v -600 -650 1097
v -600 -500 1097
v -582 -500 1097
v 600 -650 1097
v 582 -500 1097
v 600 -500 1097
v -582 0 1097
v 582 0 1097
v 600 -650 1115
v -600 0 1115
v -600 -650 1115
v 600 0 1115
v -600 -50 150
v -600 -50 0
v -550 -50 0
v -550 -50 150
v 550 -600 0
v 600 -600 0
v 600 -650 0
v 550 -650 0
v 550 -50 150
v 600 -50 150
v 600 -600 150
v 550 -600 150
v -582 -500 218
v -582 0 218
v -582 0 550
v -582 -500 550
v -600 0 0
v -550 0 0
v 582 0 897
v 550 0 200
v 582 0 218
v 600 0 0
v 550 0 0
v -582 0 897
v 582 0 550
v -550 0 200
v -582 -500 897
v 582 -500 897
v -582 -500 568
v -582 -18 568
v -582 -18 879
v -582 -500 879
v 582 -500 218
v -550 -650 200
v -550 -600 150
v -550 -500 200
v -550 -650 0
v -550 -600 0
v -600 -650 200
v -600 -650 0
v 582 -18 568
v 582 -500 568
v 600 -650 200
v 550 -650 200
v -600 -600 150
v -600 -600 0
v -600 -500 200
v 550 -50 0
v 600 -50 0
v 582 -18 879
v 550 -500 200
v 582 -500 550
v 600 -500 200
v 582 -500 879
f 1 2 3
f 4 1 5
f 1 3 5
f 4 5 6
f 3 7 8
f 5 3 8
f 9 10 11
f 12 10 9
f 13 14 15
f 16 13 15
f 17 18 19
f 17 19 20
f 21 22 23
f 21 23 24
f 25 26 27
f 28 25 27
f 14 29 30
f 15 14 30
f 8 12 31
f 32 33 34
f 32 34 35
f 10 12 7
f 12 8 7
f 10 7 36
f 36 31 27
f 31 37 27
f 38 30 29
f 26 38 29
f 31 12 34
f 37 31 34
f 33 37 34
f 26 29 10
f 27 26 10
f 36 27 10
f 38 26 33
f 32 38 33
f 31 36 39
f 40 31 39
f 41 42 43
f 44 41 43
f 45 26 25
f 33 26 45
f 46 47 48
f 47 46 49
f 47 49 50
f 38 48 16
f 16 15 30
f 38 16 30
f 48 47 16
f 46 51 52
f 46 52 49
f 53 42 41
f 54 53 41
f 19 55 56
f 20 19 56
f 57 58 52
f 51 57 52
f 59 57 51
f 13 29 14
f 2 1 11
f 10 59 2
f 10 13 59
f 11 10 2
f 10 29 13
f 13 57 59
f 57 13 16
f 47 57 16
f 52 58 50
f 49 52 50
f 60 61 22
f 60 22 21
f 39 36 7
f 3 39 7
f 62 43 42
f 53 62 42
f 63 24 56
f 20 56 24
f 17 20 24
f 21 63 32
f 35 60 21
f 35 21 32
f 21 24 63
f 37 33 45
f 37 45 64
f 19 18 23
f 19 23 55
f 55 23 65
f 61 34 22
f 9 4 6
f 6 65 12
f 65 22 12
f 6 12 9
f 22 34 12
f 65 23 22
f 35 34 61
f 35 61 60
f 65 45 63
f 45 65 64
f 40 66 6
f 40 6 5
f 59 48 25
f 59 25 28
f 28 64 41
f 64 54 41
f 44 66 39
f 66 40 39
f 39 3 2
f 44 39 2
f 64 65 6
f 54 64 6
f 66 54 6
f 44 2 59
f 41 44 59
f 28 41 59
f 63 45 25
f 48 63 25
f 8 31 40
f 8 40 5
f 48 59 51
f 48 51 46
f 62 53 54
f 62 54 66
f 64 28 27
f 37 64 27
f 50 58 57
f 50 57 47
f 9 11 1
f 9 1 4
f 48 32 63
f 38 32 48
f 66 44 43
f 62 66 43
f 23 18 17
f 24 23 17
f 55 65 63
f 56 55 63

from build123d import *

# Parameters (mm, degrees)
F1_DEPTH  = 500
F3_W      = 50
F3_H      = 50
F4_DEPTH  = 650
F5_W      = 50
F5_H      = 50
F6_DEPTH  = 200
F8_W      = 1200
F8_H      = 18
F9_DEPTH  = 150
F11_DEPTH = 1164


with BuildPart() as f1:
    # F0 (on Front) → F1 (new body)
    with BuildSketch(Plane.XZ):
        Polygon((0, 1115), (-600, 1115), (-600, 200), (0, 200), (0, 218), (-582, 218), (-582, 1097), (0, 1097), align=None)
    extrude(amount=F1_DEPTH)

    # F3 (on offset) → F4 (join)
    with BuildSketch(Plane.XZ):
        with Locations((-575, 175)):
            Rectangle(F3_W, F3_H)
    extrude(amount=F4_DEPTH)

    # F5 (on Top) → F6 (join)
    with BuildSketch(Plane.XY):
        with Locations((-575, -25)):
            Rectangle(F5_W, F5_H)
        with Locations((-575, -625)):
            Rectangle(F5_W, F5_H)
    extrude(amount=F6_DEPTH)

    # F7: F1 across plane


with BuildPart() as f1_1:
    add(f1.part)
    add(f1.part.mirror(Plane.YZ))

    # F8 (on face) → F9 (join)
    with BuildSketch(Plane.XZ.offset(500)):
        with Locations((0, 1106)):
            Rectangle(F8_W, F8_H)
    extrude(amount=F9_DEPTH)

    # F10 (on face) → F11 (join, through all)
    with BuildSketch(Plane.YZ.offset(-582)):
        Polygon((0, 897), (-500, 897), (-500, 879), (-18, 879), (-18, 568), (-500, 568), (-500, 550), (0, 550), align=None)
    extrude(amount=F11_DEPTH)


solid = f1_1.part
